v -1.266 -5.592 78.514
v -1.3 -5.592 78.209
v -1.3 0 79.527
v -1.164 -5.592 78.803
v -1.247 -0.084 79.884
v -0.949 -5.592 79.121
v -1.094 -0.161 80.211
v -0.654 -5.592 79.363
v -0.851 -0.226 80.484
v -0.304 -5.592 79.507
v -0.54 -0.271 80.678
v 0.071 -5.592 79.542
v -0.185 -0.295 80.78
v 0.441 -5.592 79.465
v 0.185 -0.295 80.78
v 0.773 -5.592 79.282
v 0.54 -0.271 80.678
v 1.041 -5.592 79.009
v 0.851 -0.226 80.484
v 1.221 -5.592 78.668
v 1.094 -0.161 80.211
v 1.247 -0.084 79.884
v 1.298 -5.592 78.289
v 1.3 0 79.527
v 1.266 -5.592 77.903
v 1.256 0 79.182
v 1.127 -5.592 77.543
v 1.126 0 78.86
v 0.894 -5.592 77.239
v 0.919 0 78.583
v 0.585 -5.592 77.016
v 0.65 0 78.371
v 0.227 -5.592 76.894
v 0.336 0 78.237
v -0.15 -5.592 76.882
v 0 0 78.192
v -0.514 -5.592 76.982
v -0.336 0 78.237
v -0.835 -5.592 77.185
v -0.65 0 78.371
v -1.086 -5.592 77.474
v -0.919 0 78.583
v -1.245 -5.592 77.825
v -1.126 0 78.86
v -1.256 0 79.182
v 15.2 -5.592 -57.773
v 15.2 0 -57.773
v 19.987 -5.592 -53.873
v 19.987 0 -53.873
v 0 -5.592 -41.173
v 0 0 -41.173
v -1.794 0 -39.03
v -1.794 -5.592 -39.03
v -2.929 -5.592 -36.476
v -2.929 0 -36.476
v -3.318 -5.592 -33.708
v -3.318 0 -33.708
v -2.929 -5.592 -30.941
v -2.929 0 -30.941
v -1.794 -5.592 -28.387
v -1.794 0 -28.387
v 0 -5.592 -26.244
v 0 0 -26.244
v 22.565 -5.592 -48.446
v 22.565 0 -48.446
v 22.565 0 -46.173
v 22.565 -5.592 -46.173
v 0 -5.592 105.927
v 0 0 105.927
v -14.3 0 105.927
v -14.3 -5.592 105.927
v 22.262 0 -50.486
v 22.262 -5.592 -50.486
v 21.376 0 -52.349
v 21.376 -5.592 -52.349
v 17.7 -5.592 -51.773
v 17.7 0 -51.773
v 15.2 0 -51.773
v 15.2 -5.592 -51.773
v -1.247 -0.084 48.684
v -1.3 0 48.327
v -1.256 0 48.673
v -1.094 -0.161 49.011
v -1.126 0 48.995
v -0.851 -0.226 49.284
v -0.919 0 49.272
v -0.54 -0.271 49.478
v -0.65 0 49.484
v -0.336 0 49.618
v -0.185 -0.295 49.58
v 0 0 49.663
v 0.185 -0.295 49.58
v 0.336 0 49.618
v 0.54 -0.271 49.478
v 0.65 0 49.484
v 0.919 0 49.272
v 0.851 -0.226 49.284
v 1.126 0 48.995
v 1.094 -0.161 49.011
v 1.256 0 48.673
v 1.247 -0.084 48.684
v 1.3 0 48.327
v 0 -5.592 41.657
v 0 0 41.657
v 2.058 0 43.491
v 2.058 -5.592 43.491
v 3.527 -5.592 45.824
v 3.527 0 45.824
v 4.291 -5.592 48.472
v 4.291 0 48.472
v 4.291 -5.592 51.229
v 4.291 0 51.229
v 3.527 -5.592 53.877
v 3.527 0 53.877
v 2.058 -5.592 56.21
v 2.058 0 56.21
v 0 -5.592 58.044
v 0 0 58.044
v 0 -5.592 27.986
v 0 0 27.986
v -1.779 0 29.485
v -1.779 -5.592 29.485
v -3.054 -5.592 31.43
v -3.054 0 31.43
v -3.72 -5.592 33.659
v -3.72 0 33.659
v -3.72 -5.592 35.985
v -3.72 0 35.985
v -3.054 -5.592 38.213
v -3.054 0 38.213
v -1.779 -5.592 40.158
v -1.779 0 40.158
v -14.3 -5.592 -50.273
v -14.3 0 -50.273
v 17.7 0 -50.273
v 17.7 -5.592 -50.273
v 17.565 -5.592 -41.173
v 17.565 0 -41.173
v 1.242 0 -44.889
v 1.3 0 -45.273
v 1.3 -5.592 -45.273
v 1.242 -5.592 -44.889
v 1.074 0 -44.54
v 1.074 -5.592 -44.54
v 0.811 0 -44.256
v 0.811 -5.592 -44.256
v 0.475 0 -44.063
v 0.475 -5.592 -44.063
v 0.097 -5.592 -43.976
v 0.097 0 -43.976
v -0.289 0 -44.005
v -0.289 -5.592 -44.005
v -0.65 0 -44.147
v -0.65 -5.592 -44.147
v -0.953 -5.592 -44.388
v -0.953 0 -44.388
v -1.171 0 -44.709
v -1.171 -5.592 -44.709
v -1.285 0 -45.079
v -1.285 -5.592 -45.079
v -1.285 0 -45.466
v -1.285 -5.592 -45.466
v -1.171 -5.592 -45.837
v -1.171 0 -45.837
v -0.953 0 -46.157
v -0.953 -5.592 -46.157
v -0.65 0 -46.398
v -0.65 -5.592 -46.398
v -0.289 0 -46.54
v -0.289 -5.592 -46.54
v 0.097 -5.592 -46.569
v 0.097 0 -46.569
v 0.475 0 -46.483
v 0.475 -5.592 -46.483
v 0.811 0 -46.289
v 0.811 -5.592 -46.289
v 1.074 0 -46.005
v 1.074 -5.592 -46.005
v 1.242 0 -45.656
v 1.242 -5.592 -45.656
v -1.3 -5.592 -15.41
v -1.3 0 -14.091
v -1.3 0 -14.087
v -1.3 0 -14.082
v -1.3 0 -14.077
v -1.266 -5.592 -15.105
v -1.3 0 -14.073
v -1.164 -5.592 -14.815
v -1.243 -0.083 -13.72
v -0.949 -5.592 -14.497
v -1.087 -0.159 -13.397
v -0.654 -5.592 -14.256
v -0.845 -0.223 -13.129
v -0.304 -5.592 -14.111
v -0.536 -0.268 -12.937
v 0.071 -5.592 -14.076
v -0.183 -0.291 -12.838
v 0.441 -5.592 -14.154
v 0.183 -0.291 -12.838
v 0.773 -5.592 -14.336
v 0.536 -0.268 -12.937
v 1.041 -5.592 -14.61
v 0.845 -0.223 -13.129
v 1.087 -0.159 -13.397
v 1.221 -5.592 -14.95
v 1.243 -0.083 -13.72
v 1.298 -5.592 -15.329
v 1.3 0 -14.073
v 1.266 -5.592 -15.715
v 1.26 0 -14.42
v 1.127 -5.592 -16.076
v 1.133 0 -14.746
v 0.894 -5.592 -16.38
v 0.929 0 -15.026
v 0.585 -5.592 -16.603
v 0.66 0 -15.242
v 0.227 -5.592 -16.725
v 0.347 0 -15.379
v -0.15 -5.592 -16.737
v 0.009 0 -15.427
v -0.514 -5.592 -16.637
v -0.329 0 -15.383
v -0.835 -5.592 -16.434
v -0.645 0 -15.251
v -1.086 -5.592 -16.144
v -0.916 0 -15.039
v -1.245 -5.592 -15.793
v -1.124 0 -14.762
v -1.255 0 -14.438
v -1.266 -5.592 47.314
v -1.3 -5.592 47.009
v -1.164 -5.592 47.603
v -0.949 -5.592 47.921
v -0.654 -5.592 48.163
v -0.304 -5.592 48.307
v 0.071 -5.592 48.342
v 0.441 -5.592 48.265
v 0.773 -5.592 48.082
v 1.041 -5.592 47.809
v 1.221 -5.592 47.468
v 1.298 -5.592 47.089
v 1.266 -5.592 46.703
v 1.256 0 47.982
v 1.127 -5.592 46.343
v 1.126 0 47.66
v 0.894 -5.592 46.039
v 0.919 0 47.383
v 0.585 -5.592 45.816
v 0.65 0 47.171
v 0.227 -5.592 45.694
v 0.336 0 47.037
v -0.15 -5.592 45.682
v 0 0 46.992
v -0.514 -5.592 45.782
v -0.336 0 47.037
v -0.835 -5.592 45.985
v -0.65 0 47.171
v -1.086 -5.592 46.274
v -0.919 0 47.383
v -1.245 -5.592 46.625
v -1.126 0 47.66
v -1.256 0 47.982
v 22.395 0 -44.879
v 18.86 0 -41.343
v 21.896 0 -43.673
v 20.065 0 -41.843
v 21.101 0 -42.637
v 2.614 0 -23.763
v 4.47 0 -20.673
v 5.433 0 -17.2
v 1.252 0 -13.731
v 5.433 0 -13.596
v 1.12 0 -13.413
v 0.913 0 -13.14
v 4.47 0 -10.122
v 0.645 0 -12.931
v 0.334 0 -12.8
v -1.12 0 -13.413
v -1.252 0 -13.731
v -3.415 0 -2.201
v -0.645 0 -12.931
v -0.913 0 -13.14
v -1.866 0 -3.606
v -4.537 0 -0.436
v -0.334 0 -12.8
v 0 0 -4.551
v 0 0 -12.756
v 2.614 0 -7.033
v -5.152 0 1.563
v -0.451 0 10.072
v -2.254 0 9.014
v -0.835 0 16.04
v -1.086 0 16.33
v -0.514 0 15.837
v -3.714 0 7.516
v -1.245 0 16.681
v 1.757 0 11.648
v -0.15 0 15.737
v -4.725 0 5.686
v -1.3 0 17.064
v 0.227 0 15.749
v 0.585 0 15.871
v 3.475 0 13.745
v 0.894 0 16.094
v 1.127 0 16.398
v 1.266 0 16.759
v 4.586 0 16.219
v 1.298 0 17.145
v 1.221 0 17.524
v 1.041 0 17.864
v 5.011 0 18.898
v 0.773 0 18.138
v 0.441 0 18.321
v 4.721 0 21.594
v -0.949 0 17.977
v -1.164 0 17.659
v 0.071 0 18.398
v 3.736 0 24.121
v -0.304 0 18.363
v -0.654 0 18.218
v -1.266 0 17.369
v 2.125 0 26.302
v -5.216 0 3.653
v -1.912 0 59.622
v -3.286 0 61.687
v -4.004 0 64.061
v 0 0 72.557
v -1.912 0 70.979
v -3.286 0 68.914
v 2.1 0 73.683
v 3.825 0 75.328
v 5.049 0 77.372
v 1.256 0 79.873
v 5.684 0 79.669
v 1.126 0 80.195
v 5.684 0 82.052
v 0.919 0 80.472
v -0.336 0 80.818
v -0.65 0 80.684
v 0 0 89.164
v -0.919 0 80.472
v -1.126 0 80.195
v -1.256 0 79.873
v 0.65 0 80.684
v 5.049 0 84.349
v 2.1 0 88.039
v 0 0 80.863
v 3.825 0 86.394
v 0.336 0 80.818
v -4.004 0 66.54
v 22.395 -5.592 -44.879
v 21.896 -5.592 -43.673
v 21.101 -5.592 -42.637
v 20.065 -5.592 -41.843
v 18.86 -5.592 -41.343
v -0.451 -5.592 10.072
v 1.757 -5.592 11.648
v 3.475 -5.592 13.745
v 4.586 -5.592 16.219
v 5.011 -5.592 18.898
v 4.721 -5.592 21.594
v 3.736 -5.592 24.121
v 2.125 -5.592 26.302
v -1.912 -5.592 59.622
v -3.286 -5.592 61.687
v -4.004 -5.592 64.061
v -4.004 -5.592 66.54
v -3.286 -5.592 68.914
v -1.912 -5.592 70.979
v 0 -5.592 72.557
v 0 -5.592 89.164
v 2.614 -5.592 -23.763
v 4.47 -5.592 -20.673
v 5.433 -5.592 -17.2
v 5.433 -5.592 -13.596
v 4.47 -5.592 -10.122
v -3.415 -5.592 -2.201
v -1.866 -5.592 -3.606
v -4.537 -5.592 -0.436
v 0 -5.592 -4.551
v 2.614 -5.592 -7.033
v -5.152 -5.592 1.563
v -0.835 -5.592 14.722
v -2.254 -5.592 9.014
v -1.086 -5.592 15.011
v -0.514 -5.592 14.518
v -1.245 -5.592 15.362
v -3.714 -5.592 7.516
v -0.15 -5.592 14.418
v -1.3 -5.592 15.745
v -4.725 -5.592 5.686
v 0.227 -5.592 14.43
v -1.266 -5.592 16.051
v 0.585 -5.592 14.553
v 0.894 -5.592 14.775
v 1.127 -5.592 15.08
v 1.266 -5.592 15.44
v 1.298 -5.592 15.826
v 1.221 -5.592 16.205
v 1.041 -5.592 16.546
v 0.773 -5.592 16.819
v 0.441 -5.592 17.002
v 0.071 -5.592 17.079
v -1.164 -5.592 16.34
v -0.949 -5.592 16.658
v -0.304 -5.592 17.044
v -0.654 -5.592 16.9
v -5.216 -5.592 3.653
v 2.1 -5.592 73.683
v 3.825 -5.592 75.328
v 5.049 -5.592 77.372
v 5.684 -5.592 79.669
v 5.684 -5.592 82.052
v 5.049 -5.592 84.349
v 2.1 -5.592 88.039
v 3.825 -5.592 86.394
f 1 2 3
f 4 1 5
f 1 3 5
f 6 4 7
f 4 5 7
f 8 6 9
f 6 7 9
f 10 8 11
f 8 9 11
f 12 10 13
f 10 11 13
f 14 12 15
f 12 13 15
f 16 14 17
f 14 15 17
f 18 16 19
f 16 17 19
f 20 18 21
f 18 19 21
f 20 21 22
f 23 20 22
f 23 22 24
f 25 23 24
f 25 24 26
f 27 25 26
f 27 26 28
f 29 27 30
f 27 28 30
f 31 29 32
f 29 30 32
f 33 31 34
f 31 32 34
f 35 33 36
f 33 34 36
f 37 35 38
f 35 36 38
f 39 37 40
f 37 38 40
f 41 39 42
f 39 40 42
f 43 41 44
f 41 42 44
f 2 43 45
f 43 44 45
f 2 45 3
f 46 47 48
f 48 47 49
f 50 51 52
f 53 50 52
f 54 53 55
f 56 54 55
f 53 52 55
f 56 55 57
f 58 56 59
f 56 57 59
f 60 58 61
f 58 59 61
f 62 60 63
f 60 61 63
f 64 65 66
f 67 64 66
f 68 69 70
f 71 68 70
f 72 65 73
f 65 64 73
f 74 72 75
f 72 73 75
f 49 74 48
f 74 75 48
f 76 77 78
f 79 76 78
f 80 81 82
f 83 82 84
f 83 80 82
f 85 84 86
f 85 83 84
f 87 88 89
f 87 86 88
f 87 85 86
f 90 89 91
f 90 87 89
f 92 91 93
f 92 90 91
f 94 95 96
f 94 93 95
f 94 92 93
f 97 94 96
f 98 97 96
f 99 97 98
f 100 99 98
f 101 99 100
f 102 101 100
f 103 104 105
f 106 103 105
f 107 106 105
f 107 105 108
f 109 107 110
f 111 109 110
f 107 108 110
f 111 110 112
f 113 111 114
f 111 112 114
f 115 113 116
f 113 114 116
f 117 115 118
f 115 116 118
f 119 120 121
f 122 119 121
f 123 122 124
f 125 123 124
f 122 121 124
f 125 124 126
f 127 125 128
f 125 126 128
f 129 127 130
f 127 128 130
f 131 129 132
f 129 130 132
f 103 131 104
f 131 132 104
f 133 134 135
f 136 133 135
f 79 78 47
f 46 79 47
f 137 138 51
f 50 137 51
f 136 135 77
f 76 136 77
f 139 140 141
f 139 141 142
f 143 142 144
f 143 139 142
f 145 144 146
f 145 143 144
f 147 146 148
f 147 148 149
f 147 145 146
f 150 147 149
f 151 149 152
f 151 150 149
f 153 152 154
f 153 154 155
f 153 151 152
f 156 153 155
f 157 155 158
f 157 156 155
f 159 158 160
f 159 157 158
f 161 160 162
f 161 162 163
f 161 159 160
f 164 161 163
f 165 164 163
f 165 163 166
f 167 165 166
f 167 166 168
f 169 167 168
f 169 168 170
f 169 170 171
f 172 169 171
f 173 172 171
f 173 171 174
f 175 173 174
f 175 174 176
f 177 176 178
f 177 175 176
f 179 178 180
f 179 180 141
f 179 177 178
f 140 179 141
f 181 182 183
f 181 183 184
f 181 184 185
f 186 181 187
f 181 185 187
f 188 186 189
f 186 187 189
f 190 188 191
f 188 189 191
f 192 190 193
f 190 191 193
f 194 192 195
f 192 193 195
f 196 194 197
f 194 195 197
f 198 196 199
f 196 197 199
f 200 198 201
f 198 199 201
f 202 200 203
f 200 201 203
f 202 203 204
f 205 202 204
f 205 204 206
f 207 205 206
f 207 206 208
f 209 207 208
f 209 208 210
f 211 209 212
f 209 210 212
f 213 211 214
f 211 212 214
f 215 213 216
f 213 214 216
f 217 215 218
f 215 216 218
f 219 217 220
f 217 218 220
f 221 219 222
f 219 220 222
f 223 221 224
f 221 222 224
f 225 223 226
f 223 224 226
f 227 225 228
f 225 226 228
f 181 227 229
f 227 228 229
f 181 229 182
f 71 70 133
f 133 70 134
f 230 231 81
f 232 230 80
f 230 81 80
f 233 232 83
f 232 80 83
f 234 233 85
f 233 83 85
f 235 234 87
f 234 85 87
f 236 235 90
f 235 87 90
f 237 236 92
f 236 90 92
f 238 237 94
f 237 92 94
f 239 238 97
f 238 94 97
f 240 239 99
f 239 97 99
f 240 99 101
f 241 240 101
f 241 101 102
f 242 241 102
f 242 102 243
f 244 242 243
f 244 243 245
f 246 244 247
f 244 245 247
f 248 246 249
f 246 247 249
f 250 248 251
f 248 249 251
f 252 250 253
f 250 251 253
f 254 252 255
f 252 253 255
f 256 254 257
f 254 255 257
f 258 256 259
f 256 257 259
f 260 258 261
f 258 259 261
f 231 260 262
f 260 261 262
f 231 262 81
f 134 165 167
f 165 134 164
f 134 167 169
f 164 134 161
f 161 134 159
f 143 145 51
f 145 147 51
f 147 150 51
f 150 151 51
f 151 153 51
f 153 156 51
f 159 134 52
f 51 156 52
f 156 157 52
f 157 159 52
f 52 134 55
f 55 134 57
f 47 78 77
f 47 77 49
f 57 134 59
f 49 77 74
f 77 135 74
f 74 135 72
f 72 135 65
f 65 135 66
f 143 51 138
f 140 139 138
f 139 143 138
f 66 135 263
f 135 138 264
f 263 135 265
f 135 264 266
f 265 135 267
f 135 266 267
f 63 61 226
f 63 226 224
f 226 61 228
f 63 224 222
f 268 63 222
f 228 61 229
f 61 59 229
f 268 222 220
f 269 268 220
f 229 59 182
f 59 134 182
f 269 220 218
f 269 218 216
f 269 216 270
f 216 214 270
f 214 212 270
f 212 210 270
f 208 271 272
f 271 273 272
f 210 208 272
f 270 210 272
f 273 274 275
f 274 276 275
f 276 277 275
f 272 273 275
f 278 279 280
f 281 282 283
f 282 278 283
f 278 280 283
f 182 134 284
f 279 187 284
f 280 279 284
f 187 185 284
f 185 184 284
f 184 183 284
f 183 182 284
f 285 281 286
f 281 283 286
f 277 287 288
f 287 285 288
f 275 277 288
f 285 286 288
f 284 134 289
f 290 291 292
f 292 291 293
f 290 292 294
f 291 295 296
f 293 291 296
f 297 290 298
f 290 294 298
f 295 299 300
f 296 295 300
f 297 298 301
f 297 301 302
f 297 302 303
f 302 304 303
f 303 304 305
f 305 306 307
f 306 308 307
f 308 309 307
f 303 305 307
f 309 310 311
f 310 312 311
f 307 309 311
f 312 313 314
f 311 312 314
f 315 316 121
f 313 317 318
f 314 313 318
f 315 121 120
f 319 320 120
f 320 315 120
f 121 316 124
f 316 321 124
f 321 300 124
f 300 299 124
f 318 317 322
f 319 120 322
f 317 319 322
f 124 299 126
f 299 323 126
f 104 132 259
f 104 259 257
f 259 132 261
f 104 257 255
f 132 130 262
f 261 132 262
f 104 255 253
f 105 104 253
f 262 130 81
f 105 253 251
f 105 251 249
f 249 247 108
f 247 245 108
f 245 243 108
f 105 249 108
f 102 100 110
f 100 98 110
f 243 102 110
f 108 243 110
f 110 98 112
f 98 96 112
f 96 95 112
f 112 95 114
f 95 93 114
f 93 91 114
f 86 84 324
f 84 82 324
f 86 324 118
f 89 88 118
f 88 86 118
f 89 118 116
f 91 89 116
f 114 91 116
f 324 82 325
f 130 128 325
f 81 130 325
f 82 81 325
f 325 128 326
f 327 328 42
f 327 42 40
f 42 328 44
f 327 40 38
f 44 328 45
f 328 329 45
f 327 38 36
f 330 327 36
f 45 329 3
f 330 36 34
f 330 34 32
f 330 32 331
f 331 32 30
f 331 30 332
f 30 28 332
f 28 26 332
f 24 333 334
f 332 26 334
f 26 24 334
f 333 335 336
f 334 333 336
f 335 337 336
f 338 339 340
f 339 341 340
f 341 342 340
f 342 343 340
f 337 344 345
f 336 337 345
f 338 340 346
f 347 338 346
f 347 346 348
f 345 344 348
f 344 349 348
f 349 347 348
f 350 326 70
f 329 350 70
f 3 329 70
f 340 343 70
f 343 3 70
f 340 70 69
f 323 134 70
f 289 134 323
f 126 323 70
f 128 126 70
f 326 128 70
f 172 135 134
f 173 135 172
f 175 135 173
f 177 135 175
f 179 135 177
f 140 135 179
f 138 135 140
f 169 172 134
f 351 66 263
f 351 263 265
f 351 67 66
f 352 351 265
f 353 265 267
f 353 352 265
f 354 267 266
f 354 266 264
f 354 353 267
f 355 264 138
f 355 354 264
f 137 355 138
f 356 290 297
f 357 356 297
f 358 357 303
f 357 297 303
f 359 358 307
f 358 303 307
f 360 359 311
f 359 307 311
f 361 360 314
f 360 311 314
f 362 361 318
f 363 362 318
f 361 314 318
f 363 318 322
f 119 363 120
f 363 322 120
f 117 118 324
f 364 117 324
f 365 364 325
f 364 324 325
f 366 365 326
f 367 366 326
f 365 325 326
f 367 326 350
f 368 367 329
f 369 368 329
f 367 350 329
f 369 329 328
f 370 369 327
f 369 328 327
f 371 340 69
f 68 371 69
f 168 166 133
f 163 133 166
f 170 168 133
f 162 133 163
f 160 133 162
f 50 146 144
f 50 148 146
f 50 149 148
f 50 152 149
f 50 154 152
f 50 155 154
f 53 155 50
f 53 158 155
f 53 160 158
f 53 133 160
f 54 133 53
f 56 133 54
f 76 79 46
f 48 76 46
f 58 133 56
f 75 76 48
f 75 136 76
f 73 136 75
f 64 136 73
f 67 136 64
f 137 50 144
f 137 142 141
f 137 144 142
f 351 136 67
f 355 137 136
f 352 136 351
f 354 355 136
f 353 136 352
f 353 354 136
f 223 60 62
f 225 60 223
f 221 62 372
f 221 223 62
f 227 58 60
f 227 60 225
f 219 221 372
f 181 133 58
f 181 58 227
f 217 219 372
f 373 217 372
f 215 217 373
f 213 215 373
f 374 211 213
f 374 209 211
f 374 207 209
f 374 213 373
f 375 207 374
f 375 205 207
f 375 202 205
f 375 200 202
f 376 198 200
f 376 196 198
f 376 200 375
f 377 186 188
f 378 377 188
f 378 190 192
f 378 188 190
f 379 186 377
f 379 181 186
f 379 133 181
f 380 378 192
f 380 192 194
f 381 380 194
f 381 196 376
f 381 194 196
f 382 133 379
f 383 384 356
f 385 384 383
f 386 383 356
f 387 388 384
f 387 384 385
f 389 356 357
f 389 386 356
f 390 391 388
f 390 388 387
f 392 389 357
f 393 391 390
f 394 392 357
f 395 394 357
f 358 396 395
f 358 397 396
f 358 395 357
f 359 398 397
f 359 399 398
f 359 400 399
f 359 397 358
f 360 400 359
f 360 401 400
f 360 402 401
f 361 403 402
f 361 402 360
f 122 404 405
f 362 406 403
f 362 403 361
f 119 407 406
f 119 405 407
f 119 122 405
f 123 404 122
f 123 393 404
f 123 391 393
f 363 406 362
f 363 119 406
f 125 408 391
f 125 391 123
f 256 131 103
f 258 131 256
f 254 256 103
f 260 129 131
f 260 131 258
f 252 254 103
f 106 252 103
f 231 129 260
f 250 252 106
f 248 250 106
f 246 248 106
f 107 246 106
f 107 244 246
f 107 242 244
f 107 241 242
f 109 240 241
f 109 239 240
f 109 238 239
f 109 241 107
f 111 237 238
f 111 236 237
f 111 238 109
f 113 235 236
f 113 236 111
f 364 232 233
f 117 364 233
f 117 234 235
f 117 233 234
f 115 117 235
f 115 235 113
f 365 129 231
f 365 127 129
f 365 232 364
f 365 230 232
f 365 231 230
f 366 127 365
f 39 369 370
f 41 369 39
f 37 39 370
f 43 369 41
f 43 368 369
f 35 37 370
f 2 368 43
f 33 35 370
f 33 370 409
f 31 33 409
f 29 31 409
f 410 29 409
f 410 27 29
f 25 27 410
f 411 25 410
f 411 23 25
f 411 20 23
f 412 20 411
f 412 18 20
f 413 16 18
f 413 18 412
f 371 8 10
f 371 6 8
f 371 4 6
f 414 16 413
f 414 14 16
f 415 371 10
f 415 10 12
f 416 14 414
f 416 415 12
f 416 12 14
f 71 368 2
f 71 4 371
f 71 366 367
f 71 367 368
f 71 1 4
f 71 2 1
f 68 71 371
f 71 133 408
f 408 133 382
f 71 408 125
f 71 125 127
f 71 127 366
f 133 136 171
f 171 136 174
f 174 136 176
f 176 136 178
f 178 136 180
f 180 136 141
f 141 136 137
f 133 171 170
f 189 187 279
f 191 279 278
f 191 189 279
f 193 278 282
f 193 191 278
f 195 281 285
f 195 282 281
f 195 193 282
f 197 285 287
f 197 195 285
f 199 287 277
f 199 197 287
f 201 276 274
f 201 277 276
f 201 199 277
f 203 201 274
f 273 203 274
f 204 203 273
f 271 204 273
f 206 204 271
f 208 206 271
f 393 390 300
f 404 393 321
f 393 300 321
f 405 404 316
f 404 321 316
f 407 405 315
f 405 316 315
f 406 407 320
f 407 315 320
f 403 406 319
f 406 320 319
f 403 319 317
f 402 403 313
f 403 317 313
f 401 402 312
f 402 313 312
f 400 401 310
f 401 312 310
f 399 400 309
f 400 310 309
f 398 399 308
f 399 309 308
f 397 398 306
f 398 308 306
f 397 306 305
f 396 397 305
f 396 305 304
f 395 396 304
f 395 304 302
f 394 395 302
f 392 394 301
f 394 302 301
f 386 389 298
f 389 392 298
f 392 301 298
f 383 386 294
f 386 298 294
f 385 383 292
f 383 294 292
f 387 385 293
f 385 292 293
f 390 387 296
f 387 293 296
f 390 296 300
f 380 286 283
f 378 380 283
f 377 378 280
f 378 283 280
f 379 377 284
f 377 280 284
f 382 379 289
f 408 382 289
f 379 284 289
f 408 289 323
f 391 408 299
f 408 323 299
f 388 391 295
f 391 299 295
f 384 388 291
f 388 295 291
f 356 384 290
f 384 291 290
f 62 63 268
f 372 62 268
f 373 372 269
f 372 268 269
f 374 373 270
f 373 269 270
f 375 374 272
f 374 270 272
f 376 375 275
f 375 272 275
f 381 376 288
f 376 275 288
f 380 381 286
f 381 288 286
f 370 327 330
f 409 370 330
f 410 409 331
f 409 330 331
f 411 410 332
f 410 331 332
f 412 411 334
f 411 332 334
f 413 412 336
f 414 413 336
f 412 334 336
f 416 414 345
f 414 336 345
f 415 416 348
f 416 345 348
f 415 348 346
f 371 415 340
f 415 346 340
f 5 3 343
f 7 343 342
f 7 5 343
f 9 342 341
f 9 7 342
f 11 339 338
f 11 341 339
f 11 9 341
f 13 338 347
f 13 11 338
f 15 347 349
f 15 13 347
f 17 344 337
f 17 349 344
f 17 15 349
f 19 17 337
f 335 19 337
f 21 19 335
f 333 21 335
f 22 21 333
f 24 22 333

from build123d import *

# Parameters (mm, degrees)
F0_R      = 1.3
F9_DEPTH  = 5.59188
F3_R      = 1.3
F7_R      = 1.3
F8_R      = 1.3
F4_R      = 1.3
F10_DEPTH = 12.5
F11_R     = 5
F12_R     = 7


with BuildPart() as f9:
    # F0 (on Front) → F9 (new body)
    with BuildSketch(Plane.XZ):
        with BuildLine():
            Line((0, 105.927363), (-14.3, 105.927363))
            Line((-14.3, 105.927363), (-14.3, -50.272637))
            Line((-14.3, -50.272637), (17.7, -50.272637))
            Line((17.7, -50.272637), (17.7, -51.772637))
            Line((17.7, -51.772637), (15.2, -51.772637))
            Line((15.2, -51.772637), (15.2, -57.772637))
            Line((15.2, -57.772637), (22.56546, -51.772637))
            Line((22.56546, -51.772637), (22.56546, -41.172637))
            Line((22.56546, -41.172637), (0, -41.172637))
            ThreePointArc((0, -41.172637), (-3.317792, -33.70843), (0, -26.244223))
            ThreePointArc((0, -26.244223), (5.555396, -15.397738), (0, -4.551252))
            ThreePointArc((0, -4.551252), (-5.254266, 2.605622), (-0.450577, 10.072397))
            ThreePointArc((-0.450577, 10.072397), (5.010963, 18.897612), (0, 27.986236))
            ThreePointArc((0, 27.986236), (-3.804451, 34.821723), (0, 41.657209))
            ThreePointArc((0, 41.657209), (4.388049, 49.850428), (0, 58.043648))
            ThreePointArc((0, 58.043648), (-4.094802, 65.3005), (0, 72.557352))
            ThreePointArc((0, 72.557352), (5.764102, 80.860864), (0, 89.164376))
            Line((0, 89.164376), (0, 105.927363))
        make_face()
        with Locations((0, -45.272637)):
            Circle(F0_R, mode=Mode.SUBTRACT)
    extrude(amount=F9_DEPTH)

    # F3 (on face) + F7 (on face) + F8 (on face) + F4 (on face) → F10 (cut, symmetric)
    with BuildSketch(Plane(origin=(0, -3.143985, -0.741469), x_dir=(-1, 0, 0), z_dir=(0, 0.973299, 0.22954))):
        with Locations((0, -13.714992)):
            Circle(F3_R)
    with BuildSketch(Plane(origin=(0, 10.796876, 2.546305), x_dir=(-1, 0, 0), z_dir=(0, 0.973299, 0.22954))):
        with Locations((0, 47.036983)):
            Circle(F7_R)
    with BuildSketch(Plane(origin=(0, 17.767307, 4.190192), x_dir=(-1, 0, 0), z_dir=(0, 0.973299, 0.22954))):
        with Locations((0, 77.403918)):
            Circle(F8_R)
    with BuildSketch(Plane(origin=(0, 3.826445, 0.902418), x_dir=(-1, 0, 0), z_dir=(0, 0.973299, 0.22954))):
        with Locations((0, 16.608408)):
            Circle(F4_R)
    extrude(amount=F10_DEPTH, both=True, mode=Mode.SUBTRACT)

    # F11
    f11_edges = [f9.edges().sort_by_distance(p)[0] for p in [
        (22.56546, -2.79594, -41.172637),
    ]]
    fillet(f11_edges, radius=F11_R)

    # F12
    f12_edges = [f9.edges().sort_by_distance(p)[0] for p in [
        (22.56546, -2.79594, -51.772637),
    ]]
    fillet(f12_edges, radius=F12_R)


solid = f9.part
